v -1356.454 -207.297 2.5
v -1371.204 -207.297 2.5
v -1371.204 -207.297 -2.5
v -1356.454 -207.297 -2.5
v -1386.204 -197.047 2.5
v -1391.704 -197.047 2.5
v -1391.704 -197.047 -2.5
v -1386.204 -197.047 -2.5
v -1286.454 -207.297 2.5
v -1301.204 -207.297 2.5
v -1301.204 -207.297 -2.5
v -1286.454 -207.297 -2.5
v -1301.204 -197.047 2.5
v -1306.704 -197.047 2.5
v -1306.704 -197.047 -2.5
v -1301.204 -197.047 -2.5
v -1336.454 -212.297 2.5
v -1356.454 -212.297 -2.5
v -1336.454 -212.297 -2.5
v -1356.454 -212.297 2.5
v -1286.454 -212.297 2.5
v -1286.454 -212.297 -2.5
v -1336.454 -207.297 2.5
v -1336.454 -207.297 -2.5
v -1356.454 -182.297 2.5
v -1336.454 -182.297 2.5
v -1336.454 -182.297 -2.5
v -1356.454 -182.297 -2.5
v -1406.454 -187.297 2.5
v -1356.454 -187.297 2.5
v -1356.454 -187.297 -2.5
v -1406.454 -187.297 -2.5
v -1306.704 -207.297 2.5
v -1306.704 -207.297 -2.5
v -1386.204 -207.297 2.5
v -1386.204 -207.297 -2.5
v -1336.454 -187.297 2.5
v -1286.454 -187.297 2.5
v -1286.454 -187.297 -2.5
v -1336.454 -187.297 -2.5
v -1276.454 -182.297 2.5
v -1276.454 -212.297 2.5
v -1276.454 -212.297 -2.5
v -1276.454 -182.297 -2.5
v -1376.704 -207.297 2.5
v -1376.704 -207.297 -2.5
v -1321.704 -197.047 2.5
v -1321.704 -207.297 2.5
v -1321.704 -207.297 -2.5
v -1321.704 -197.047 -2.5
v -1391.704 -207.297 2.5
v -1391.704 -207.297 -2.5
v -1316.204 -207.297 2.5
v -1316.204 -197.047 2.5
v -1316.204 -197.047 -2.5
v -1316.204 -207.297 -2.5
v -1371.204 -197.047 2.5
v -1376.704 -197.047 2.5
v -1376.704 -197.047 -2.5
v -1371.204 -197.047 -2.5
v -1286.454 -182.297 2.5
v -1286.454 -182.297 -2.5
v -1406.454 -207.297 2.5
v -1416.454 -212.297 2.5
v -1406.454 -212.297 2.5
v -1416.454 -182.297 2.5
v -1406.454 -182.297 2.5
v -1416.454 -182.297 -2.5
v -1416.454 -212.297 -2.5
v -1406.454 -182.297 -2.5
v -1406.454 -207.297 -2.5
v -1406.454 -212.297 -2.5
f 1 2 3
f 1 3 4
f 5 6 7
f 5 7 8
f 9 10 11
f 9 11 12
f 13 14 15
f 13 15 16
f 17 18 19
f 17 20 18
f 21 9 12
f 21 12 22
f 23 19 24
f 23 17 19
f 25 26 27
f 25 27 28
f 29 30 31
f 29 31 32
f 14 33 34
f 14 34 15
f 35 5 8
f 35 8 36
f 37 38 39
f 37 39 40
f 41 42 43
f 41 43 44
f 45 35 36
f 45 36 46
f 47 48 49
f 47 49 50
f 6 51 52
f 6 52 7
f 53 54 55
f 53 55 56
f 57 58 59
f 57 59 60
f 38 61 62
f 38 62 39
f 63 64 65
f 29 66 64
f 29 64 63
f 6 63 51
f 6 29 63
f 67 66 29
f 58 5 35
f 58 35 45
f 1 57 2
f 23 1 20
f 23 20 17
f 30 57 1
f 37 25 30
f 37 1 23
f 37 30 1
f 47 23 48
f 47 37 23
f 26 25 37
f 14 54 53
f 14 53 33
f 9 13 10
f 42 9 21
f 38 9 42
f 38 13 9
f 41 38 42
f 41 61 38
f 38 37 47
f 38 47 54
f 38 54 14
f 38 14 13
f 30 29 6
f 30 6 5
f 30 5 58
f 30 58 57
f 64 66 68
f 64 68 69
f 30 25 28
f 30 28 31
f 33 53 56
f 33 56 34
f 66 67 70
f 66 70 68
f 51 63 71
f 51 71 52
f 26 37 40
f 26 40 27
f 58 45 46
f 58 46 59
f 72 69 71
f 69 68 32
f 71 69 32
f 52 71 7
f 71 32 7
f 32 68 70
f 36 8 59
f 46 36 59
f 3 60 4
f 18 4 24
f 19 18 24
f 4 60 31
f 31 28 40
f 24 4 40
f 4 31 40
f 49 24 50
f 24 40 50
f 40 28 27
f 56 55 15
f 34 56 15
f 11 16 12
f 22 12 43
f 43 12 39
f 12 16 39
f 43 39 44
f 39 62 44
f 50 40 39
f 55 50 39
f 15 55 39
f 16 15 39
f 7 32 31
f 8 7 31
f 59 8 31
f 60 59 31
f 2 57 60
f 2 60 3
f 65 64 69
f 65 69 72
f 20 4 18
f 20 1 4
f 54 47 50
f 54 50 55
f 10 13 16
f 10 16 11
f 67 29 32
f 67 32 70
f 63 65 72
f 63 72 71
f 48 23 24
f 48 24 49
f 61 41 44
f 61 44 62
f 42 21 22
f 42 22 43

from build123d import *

# Parameters (mm, degrees)
BOSS_EXTRUDE1_DEPTH = 2.5


with BuildPart() as part:
    # Sketch2 → Boss-Extrude1 (new, symmetric)
    with BuildSketch(Plane.XY):
        Polygon((-1336.454343847, -212.29700175), (-1336.454343847, -207.29700175), (-1321.70434708, -207.29700175), (-1321.70434708, -197.04700175), (-1316.20434708, -197.04700175), (-1316.20434708, -207.29700175), (-1306.70434708, -207.29700175), (-1306.70434708, -197.04700175), (-1301.20434708, -197.04700175), (-1301.20434708, -207.29700175), (-1286.454340614, -207.29700175), (-1286.454340614, -212.29700175), (-1276.454340614, -212.29700175), (-1276.454340614, -182.29700175), (-1286.454340614, -182.29700175), (-1286.454340614, -187.29700175), (-1336.454343847, -187.29700175), (-1336.454343847, -182.29700175), (-1356.454343847, -182.29700175), (-1356.454343847, -187.29700175), (-1406.454340614, -187.29700175), (-1406.454340614, -182.29700175), (-1416.454340614, -182.29700175), (-1416.454340614, -212.29700175), (-1406.454340614, -212.29700175), (-1406.454340614, -207.29700175), (-1391.704340614, -207.29700175), (-1391.704340614, -197.04700175), (-1386.204340614, -197.04700175), (-1386.204340614, -207.29700175), (-1376.704340614, -207.29700175), (-1376.704340614, -197.04700175), (-1371.204340614, -197.04700175), (-1371.204340614, -207.29700175), (-1356.454343847, -207.29700175), (-1356.454343847, -212.29700175), align=None)
    extrude(amount=BOSS_EXTRUDE1_DEPTH, both=True)


solid = part.part
